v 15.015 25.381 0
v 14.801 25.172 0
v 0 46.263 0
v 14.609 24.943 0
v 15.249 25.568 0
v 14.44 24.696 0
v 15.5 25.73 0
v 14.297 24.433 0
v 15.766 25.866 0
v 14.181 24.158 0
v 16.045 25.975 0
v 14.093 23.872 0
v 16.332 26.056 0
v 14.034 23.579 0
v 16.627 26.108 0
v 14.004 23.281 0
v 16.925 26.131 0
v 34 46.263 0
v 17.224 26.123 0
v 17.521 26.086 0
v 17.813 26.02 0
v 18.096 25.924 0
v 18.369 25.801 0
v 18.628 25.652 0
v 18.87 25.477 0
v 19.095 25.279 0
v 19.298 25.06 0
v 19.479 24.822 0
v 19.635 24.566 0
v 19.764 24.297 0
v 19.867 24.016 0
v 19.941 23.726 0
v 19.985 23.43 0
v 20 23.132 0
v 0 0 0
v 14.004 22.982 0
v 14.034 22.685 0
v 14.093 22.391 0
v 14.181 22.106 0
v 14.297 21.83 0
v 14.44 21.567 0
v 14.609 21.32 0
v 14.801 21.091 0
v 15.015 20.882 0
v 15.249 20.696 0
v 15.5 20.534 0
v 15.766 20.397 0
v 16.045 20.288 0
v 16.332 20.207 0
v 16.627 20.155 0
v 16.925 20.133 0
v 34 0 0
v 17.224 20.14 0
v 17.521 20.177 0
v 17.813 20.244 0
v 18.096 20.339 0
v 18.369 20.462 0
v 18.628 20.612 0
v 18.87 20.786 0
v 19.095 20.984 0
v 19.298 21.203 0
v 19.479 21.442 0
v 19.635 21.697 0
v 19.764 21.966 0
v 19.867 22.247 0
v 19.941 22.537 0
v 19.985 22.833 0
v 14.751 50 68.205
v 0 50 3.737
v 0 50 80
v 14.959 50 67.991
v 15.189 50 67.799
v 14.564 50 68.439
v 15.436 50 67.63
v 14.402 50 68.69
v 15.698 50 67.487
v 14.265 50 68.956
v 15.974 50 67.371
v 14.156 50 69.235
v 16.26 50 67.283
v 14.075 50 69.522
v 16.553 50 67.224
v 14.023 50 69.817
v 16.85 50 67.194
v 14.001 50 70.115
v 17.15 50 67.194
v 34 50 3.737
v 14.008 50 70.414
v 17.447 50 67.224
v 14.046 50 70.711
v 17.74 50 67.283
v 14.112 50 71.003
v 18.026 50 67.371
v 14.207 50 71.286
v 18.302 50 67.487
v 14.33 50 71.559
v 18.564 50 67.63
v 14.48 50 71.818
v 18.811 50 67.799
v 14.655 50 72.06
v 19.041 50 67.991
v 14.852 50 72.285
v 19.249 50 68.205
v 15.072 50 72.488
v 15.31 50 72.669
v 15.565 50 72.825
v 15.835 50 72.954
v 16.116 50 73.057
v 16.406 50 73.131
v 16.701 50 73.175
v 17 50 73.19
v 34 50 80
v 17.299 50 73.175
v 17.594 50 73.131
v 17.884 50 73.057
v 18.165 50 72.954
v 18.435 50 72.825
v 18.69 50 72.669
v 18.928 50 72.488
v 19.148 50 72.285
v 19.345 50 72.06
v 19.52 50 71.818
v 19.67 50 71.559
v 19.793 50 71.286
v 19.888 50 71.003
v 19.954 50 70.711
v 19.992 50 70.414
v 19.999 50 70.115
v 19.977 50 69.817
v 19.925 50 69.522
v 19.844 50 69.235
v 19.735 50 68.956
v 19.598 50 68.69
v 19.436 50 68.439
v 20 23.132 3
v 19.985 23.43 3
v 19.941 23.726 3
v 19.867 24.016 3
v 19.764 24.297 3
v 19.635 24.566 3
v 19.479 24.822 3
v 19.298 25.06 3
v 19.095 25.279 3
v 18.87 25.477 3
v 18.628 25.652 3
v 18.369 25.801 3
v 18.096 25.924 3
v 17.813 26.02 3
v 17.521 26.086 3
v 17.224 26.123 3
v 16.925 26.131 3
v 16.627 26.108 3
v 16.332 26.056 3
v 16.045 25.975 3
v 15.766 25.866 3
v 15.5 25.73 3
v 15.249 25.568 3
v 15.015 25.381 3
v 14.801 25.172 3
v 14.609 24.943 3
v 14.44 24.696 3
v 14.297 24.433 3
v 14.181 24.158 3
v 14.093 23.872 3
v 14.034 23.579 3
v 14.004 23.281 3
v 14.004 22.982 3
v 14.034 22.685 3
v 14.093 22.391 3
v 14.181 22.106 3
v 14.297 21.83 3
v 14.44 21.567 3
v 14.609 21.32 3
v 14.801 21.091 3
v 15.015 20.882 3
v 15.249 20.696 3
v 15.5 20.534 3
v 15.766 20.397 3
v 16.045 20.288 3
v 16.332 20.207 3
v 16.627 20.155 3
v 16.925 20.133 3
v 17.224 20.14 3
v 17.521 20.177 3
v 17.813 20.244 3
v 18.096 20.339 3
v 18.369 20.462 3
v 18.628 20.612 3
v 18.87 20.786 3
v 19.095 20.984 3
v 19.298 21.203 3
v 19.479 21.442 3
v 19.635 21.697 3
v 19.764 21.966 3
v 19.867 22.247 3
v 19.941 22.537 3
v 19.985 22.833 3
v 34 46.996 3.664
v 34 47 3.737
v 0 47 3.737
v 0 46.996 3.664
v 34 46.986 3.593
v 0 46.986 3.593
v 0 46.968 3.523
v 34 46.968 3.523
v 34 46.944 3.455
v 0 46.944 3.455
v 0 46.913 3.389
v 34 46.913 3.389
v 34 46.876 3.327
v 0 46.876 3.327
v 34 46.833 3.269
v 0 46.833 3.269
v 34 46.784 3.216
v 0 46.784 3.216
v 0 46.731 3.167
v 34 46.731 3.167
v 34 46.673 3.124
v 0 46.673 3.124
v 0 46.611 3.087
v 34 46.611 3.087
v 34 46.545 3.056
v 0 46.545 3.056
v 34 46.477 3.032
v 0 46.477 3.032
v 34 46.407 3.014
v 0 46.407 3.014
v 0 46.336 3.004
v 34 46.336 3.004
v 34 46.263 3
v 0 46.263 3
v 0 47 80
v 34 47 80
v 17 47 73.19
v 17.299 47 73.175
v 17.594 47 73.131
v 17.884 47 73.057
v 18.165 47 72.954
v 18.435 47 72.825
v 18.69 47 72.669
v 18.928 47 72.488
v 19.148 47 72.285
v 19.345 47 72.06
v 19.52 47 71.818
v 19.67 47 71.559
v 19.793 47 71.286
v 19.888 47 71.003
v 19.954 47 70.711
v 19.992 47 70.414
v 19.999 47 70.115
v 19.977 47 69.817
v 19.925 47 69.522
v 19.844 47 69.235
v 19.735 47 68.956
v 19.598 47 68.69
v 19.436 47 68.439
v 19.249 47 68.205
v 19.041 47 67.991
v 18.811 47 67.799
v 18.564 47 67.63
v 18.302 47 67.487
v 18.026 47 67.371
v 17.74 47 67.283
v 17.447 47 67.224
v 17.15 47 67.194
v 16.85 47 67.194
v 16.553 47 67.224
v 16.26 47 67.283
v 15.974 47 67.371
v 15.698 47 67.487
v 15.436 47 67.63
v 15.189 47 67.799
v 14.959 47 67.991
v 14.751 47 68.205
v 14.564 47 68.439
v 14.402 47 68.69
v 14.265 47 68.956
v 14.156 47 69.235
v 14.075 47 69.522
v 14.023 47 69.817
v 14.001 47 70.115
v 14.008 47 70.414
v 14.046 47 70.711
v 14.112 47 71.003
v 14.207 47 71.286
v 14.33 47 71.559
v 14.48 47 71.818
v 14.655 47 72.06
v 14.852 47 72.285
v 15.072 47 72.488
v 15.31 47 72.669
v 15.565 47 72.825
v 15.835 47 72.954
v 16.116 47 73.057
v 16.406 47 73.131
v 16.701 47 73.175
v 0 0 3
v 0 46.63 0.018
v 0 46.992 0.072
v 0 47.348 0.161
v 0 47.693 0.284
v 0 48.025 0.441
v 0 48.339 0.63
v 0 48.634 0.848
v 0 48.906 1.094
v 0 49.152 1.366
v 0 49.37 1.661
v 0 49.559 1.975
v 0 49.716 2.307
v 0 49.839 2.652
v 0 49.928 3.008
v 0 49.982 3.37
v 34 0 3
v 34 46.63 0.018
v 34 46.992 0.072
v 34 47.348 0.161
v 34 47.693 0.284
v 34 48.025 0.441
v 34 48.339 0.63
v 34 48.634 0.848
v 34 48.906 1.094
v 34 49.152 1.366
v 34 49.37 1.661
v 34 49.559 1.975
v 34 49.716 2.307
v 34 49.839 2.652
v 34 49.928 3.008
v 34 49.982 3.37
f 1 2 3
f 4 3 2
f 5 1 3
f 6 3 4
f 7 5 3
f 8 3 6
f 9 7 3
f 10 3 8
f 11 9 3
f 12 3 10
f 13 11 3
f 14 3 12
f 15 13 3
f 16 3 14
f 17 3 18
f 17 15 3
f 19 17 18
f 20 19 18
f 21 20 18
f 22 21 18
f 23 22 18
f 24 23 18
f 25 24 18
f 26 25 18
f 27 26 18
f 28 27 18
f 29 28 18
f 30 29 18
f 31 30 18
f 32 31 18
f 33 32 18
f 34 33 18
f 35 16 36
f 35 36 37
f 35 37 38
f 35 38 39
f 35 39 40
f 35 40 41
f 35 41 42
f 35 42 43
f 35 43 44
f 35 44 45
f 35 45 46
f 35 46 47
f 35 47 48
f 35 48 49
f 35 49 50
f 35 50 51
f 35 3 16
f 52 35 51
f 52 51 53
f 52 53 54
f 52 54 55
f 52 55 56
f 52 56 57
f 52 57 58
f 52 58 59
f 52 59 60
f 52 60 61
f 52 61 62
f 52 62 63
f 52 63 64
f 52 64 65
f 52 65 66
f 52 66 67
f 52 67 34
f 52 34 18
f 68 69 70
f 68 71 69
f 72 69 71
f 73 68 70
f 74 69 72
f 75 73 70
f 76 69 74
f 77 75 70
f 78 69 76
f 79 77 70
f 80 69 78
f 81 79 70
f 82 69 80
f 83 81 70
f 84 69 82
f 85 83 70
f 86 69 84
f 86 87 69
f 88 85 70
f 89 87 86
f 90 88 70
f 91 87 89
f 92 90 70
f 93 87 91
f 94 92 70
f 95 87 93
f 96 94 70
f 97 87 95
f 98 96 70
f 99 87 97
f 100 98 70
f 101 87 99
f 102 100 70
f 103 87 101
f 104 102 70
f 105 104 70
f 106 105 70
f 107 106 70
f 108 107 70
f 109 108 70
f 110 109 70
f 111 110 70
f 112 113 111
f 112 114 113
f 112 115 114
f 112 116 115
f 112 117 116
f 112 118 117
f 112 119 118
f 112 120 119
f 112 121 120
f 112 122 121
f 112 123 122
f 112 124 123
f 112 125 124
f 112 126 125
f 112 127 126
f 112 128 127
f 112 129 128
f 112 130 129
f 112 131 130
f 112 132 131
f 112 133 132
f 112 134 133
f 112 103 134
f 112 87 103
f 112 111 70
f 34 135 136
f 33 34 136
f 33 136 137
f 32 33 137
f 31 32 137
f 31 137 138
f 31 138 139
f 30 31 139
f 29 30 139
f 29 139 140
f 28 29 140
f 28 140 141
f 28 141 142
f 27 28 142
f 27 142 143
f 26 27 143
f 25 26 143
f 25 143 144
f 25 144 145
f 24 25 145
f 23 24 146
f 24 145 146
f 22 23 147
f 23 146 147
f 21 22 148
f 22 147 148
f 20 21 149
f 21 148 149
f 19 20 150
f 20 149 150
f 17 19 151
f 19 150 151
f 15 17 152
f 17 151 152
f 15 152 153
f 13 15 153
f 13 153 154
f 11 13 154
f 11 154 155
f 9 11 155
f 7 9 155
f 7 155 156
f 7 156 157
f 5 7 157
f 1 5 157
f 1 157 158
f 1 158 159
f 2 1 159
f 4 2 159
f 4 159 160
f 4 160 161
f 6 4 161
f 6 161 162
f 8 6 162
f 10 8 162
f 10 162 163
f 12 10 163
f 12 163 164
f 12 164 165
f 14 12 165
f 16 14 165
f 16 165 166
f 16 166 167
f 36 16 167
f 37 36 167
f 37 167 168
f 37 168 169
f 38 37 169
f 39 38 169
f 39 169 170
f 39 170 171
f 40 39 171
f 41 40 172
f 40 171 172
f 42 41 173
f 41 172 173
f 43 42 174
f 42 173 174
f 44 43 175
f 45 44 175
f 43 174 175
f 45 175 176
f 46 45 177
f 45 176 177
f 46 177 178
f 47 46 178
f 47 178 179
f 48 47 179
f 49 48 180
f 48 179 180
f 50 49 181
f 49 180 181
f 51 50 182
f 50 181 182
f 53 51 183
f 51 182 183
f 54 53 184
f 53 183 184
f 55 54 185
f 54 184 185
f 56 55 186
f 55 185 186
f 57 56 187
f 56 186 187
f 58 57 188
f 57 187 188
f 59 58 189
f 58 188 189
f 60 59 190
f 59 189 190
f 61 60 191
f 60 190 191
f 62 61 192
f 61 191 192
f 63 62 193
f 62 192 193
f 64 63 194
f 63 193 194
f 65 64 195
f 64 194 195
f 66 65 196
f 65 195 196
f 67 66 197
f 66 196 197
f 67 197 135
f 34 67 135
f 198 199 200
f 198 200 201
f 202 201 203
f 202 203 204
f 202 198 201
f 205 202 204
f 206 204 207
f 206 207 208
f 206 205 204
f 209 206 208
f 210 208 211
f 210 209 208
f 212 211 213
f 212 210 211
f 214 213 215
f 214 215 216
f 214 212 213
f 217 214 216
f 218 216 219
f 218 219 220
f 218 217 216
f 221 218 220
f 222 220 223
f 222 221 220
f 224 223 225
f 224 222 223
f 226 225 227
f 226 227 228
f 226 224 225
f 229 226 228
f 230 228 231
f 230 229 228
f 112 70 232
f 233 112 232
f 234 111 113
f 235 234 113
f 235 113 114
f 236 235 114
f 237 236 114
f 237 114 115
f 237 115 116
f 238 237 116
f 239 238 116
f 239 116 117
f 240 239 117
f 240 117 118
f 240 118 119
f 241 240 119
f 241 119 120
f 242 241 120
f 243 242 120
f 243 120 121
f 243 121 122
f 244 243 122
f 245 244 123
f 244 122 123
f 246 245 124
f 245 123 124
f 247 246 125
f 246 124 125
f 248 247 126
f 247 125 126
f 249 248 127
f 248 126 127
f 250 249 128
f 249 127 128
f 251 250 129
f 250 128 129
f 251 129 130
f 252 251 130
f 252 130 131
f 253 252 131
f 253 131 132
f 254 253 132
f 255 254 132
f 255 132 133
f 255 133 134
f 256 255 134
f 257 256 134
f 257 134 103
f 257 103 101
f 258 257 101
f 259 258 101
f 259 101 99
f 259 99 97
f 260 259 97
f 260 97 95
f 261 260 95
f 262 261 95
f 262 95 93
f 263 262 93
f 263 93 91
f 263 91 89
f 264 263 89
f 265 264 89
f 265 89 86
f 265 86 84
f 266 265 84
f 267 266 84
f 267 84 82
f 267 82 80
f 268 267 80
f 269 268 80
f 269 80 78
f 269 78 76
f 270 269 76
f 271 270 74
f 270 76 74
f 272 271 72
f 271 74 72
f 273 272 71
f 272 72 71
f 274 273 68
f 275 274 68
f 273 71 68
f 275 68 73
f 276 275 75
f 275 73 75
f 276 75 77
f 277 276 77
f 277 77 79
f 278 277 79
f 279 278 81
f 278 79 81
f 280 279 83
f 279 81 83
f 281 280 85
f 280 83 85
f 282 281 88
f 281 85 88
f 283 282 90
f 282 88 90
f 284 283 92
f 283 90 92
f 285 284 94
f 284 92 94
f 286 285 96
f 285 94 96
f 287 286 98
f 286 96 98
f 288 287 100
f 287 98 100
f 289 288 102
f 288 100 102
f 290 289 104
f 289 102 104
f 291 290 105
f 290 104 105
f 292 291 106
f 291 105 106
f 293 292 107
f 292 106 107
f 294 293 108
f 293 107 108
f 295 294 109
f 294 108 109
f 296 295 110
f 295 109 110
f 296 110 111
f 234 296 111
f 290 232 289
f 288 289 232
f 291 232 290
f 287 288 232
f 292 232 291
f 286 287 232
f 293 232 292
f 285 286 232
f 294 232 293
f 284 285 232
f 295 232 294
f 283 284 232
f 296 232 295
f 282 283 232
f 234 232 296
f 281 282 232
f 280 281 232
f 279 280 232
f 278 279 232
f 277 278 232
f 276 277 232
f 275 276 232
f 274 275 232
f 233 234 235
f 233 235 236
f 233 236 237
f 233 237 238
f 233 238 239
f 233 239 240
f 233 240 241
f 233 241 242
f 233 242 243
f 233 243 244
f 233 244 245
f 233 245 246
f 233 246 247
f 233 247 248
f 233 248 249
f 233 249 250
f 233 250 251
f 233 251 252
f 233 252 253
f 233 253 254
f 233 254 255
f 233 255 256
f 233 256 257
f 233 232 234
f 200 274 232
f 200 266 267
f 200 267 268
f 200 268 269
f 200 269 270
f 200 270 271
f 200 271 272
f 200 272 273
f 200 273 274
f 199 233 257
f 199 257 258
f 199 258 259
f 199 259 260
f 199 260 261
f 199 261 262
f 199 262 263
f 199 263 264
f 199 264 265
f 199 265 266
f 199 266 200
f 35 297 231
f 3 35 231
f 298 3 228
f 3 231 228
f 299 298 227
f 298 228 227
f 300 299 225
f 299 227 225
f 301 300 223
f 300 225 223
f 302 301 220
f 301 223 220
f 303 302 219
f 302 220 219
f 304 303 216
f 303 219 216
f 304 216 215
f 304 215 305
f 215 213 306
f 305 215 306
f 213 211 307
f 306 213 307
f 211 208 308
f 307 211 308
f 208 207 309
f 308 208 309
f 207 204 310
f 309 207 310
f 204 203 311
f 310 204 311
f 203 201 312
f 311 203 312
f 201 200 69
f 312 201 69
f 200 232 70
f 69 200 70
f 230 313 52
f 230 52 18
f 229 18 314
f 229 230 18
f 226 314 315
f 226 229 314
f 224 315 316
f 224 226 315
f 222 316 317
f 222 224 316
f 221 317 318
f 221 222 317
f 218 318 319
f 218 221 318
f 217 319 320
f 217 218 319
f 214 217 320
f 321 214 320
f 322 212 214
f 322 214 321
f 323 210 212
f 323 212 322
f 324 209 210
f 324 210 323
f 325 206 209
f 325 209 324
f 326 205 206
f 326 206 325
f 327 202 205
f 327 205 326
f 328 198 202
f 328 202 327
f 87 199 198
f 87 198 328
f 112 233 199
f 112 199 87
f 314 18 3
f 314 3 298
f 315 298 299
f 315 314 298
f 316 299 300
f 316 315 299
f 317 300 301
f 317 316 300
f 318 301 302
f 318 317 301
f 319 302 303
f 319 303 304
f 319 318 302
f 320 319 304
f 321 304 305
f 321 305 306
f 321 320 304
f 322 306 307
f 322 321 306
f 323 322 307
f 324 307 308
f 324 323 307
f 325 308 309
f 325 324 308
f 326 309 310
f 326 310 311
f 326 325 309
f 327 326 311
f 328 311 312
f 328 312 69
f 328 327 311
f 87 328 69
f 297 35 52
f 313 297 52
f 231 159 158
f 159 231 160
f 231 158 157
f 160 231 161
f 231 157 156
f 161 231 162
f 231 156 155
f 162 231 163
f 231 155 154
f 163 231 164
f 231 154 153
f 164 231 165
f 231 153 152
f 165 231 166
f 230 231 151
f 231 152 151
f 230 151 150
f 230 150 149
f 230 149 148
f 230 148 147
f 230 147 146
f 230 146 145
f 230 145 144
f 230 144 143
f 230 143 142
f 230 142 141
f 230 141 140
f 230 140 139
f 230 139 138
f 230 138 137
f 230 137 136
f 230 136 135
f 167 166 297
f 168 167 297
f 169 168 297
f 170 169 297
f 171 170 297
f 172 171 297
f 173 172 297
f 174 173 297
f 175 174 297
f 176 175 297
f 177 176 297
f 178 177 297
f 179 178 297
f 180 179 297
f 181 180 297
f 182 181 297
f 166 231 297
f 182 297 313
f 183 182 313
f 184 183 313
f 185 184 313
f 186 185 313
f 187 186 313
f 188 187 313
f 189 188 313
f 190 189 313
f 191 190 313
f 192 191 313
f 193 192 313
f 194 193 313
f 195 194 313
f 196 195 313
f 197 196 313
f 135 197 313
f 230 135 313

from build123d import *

# Parameters (mm, degrees)
SKETCH1_W                    = 34
SKETCH1_H                    = 3
BASE_FLANGE1_DEPTH           = 50
EDGE_FLANGE1_STRIP_W         = 13.4732
EDGE_FLANGE1_STRIP_H         = 3
EDGE_FLANGE1_STRIP_CUT_DEPTH = 34
EDGE_FLANGE1_DEPTH           = 34
SKETCH9_R                    = 3
CUT_EXTRUDE1_DEPTH           = 10
SKETCH10_R                   = 3
CUT_EXTRUDE2_DEPTH           = 10


# Sheet-metal steps are written as plain solids
with BuildPart() as part:
    # Sketch1 → Base-Flange1 (new body)
    with BuildSketch(Plane(origin=(0, 0, 0), x_dir=(1, 0, 0), z_dir=(0, 1, 0))):
        with Locations((17, -1.5)):
            Rectangle(SKETCH1_W, SKETCH1_H)
    extrude(amount=BASE_FLANGE1_DEPTH)

    # Edge-Flange1 strip (across the edge) → Edge-Flange1 strip cut (cut)
    with BuildSketch(Plane(origin=(34, 50, 3), x_dir=(0, -1, 0), z_dir=(-1, 0, 0))):
        with Locations((-3, -1.5)):
            Rectangle(EDGE_FLANGE1_STRIP_W, EDGE_FLANGE1_STRIP_H)
    extrude(amount=EDGE_FLANGE1_STRIP_CUT_DEPTH, mode=Mode.SUBTRACT)

    # Edge-Flange1 section (across the edge) → Edge-Flange1 (add)
    with BuildSketch(Plane(origin=(34, 50, 3), x_dir=(0, -1, 0), z_dir=(-1, 0, 0))):
        with BuildLine():
            Line((0, 0.7366), (0, 77))
            Line((0, 77), (3, 77))
            Line((3, 77), (3, 0.7366))
            ThreePointArc((3, 0.7366), (3.215745145, 0.215745145), (3.7366, 0))
            Line((3.7366, 0), (3.7366, -3))
            ThreePointArc((3.7366, -3), (1.094424801, -1.905575199), (0, 0.7366))
        make_face()
    extrude(amount=EDGE_FLANGE1_DEPTH)

    # Sketch9 → Cut-Extrude1 (cut)
    with BuildSketch(Plane(origin=(0, 50, 0), x_dir=(1, 0, 0), z_dir=(0, 1, 0))):
        with Locations(Location((17, -70.19, 0), (0, 0, 270))):
            Circle(SKETCH9_R)
    extrude(amount=-CUT_EXTRUDE1_DEPTH, mode=Mode.SUBTRACT)

    # Sketch10 → Cut-Extrude2 (cut)
    with BuildSketch(Plane.XY.offset(3)):
        with Locations((17, 23.1317)):
            Circle(SKETCH10_R)
    extrude(amount=-CUT_EXTRUDE2_DEPTH, mode=Mode.SUBTRACT)


solid = part.part
